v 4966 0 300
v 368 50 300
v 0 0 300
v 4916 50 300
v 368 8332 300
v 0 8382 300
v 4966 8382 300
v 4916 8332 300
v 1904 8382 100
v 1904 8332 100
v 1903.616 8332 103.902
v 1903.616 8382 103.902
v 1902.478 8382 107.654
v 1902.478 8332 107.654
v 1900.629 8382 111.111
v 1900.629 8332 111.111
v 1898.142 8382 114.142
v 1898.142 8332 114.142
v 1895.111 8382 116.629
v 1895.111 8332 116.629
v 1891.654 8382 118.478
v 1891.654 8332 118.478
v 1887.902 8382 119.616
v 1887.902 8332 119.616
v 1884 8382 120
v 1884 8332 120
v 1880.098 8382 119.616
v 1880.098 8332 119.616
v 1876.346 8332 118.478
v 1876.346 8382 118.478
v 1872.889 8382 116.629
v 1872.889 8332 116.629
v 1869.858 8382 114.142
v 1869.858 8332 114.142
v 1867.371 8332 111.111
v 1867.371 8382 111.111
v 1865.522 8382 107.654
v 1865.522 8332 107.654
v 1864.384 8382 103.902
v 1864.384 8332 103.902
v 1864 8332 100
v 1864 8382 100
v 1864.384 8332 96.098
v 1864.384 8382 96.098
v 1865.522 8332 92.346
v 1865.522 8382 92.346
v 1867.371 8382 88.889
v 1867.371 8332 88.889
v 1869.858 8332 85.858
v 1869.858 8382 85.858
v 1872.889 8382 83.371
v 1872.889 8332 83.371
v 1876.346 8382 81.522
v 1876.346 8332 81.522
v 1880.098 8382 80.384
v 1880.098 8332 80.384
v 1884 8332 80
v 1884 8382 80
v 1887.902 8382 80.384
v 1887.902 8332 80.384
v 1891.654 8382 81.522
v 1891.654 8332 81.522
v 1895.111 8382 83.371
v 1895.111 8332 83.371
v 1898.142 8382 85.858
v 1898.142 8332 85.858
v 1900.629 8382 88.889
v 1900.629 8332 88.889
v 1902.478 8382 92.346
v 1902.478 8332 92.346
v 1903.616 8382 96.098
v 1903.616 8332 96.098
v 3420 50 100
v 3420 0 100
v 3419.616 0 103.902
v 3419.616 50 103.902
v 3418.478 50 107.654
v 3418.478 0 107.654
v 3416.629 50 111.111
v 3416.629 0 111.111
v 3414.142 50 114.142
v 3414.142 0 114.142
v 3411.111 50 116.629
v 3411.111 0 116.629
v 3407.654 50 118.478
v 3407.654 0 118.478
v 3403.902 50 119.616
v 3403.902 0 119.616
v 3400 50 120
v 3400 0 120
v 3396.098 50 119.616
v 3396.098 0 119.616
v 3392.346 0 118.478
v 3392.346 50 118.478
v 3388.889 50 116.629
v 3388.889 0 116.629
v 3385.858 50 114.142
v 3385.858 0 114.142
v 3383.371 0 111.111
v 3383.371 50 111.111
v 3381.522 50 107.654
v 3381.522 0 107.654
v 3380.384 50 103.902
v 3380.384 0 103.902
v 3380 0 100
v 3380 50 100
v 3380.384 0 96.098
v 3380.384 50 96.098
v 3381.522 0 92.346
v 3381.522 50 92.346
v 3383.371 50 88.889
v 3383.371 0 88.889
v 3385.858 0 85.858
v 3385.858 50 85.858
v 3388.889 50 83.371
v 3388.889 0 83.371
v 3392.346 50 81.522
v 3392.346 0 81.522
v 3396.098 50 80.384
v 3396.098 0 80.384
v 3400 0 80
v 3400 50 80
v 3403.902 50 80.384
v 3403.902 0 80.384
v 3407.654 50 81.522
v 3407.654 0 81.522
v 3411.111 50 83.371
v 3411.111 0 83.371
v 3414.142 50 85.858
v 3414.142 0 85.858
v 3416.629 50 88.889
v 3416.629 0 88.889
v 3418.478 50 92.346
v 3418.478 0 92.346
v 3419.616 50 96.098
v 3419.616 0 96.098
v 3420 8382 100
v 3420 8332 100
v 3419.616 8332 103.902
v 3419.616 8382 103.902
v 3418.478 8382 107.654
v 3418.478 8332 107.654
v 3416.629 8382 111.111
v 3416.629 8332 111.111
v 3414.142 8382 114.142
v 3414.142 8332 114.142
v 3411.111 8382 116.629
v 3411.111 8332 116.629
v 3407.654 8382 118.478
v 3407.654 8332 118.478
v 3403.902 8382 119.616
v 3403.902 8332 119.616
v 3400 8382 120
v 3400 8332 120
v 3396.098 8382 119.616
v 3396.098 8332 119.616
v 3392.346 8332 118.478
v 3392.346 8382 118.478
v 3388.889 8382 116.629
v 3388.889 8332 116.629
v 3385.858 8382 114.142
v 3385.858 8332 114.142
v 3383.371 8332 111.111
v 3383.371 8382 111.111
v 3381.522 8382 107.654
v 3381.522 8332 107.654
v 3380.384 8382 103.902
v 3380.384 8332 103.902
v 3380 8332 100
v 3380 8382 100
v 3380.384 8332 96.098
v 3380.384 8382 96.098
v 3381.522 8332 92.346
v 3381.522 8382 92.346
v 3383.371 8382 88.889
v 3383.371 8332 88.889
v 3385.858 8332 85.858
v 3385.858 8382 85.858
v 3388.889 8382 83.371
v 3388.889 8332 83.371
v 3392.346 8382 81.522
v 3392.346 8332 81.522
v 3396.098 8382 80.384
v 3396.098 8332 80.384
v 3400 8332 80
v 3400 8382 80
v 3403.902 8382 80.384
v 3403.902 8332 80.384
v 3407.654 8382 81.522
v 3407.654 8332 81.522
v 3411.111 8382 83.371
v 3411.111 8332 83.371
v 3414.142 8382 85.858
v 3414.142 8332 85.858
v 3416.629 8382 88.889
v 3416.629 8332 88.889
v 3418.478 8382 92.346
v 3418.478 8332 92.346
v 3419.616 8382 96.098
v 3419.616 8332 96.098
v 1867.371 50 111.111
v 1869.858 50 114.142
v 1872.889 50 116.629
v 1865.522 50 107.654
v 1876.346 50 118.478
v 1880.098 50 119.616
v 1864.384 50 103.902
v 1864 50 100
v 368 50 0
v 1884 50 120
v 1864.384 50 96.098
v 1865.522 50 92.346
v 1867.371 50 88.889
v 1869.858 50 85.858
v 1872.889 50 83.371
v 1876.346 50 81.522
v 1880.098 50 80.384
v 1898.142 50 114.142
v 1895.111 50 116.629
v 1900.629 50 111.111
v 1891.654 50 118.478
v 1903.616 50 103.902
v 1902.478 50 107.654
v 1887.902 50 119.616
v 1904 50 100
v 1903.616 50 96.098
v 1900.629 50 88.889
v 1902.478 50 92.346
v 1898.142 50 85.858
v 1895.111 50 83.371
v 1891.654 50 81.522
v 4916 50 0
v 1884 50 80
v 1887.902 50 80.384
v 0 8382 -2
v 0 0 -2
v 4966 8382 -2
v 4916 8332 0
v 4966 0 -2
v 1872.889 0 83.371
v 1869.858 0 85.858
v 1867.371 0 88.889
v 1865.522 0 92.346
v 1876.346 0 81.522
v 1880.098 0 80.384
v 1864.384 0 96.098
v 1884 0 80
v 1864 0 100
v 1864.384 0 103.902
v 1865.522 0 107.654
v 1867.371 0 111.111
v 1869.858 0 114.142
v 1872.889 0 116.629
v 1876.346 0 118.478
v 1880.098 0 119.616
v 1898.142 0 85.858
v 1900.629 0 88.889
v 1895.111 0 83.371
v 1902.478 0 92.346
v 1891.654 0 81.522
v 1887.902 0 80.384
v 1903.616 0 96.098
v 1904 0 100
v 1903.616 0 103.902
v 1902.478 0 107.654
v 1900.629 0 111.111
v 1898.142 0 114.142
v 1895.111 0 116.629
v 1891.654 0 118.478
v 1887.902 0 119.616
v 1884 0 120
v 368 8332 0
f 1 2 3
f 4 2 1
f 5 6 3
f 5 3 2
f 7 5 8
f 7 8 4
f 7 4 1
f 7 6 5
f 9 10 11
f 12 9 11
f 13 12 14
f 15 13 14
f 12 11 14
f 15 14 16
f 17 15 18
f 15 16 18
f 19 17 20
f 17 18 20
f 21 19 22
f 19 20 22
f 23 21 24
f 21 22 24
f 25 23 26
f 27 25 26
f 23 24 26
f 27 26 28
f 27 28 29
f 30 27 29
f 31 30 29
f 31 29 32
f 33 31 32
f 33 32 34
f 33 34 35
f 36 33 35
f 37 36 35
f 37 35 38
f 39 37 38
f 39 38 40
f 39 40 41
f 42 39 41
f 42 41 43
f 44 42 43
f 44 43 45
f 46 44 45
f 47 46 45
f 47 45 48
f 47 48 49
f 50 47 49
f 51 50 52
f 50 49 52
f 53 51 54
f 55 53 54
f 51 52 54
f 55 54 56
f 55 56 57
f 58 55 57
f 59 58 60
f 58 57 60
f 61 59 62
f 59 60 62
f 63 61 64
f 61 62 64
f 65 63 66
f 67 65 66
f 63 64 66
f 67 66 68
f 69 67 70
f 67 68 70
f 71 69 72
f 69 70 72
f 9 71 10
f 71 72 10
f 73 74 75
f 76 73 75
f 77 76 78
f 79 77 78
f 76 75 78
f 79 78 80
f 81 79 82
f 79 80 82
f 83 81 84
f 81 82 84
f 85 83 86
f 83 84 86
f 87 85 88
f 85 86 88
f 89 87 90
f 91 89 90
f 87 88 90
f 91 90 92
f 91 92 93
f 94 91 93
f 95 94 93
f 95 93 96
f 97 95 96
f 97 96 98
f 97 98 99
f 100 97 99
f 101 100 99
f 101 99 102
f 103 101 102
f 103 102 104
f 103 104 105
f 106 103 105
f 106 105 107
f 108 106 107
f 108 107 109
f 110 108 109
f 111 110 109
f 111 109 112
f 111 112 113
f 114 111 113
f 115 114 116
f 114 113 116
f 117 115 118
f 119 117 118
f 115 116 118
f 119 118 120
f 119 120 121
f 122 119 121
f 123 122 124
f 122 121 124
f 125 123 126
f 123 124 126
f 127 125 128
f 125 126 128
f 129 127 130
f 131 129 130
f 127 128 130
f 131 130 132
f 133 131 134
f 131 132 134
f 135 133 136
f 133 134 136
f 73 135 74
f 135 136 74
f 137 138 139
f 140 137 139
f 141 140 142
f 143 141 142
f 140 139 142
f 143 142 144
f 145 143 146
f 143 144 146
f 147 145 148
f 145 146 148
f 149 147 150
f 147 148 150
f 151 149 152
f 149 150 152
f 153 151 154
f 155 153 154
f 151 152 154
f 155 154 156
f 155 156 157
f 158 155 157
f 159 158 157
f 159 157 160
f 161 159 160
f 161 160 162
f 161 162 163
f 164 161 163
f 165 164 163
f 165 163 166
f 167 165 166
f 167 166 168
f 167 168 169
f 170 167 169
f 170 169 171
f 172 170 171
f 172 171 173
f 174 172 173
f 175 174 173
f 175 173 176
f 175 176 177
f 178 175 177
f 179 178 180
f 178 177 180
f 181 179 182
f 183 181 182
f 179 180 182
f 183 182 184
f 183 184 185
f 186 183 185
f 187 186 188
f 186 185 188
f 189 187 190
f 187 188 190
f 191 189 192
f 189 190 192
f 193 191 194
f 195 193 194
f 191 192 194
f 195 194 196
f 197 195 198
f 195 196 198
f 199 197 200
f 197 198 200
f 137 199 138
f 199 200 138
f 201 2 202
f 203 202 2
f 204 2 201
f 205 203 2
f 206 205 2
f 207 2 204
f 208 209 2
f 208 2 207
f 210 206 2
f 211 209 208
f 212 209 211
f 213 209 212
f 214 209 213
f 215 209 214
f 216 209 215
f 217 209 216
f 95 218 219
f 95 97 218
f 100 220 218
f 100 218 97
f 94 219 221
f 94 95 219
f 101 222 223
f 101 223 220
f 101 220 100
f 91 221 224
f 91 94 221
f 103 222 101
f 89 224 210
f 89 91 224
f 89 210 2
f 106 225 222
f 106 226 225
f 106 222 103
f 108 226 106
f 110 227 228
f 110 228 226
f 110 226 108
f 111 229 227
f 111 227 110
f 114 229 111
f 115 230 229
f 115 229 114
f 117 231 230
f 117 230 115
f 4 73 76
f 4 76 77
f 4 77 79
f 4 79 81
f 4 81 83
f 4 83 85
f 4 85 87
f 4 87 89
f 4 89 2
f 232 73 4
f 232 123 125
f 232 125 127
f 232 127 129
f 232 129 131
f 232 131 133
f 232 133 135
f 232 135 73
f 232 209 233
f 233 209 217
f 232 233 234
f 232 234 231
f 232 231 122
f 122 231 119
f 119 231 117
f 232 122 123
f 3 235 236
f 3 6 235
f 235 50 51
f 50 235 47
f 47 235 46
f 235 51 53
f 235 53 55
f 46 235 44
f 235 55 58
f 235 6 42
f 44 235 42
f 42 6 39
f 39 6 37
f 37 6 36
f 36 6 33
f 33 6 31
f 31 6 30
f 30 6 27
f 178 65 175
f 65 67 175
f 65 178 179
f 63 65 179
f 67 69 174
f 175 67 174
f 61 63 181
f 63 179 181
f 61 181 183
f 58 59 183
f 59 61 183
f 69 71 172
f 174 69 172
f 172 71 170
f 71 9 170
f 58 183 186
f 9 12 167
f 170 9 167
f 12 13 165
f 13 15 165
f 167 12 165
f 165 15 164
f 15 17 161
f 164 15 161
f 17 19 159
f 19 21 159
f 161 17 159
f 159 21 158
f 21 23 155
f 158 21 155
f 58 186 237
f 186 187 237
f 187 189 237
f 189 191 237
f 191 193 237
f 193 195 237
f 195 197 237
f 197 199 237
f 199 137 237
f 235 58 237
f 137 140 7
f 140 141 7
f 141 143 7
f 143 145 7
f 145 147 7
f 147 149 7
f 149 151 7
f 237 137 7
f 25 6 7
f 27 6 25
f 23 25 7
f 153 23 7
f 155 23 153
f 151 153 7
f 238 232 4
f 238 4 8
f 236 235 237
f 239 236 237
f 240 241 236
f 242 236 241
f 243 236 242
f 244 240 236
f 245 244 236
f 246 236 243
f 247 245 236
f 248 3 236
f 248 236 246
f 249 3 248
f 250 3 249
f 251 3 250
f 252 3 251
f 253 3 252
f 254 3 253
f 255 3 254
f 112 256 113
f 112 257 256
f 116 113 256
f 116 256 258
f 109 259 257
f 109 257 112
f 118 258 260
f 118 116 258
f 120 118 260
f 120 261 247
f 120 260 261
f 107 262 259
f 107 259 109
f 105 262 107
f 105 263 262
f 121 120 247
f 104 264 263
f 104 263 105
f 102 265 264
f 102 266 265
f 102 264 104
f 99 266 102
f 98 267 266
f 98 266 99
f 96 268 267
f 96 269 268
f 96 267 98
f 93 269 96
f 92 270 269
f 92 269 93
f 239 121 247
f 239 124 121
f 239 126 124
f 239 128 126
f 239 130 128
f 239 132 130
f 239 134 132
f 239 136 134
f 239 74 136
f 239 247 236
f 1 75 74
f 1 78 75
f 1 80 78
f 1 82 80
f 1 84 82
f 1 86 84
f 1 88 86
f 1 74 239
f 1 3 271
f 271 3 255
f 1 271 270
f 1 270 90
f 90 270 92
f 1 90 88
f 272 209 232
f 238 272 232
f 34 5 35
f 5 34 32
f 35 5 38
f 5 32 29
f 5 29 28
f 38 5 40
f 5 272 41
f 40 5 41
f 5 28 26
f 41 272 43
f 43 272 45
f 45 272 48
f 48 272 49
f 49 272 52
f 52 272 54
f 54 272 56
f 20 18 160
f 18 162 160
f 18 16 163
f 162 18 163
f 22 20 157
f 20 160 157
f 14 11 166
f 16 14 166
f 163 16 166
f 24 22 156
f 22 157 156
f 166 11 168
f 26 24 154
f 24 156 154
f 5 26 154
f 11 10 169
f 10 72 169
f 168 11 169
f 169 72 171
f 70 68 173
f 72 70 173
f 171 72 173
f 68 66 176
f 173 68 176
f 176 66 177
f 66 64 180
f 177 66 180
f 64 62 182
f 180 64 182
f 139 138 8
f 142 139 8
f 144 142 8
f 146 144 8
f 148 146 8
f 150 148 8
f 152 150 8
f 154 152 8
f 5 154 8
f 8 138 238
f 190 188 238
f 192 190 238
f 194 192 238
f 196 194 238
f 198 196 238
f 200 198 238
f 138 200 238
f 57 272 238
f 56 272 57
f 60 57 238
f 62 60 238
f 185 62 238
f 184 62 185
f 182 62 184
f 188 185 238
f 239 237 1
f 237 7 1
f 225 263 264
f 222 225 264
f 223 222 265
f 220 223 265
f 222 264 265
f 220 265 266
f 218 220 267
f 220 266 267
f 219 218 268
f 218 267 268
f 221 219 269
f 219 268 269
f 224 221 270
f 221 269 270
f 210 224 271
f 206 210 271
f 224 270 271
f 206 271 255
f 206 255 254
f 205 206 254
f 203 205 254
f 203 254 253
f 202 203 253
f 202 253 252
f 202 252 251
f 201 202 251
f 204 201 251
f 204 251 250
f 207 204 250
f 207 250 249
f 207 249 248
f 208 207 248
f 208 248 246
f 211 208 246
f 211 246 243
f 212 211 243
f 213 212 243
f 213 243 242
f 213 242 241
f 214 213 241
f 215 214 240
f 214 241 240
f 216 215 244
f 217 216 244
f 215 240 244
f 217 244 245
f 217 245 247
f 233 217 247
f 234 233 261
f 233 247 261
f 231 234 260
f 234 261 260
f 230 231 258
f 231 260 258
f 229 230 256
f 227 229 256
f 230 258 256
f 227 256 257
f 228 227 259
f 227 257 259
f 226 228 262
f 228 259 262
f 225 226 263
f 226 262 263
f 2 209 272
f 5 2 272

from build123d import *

# Parameters (mm, degrees)
F0_W     = 4966
F0_H     = 8382
F0_W_2   = 4548
F0_H_2   = 8282
F1_DEPTH = 300
F2_W     = 4966
F2_H     = 8382
F3_DEPTH = 2
F4_R     = 20
F5_DEPTH = 8382.001


with BuildPart() as f1:
    # F0 (on Top) → F1 (new body)
    with BuildSketch(Plane.XY):
        with Locations((2483, 4191)):
            Rectangle(F0_W, F0_H)
        with Locations((2642, 4191)):
            Rectangle(F0_W_2, F0_H_2, mode=Mode.SUBTRACT)
    extrude(amount=F1_DEPTH)

    # F2 (on face) → F3 (join)
    with BuildSketch(Plane(origin=(0, 0, 0), x_dir=(1, 0, 0), z_dir=(0, 0, -1))):
        with Locations((2483, -4191)):
            Rectangle(F2_W, F2_H)
    extrude(amount=F3_DEPTH)

    # F4 (on face) → F5 (cut, through all)
    with BuildSketch(Plane.XZ):
        with Locations((1884, 100)):
            Circle(F4_R)
        with Locations((3400, 100)):
            Circle(F4_R)
    extrude(amount=-F5_DEPTH, mode=Mode.SUBTRACT)


solid = f1.part
